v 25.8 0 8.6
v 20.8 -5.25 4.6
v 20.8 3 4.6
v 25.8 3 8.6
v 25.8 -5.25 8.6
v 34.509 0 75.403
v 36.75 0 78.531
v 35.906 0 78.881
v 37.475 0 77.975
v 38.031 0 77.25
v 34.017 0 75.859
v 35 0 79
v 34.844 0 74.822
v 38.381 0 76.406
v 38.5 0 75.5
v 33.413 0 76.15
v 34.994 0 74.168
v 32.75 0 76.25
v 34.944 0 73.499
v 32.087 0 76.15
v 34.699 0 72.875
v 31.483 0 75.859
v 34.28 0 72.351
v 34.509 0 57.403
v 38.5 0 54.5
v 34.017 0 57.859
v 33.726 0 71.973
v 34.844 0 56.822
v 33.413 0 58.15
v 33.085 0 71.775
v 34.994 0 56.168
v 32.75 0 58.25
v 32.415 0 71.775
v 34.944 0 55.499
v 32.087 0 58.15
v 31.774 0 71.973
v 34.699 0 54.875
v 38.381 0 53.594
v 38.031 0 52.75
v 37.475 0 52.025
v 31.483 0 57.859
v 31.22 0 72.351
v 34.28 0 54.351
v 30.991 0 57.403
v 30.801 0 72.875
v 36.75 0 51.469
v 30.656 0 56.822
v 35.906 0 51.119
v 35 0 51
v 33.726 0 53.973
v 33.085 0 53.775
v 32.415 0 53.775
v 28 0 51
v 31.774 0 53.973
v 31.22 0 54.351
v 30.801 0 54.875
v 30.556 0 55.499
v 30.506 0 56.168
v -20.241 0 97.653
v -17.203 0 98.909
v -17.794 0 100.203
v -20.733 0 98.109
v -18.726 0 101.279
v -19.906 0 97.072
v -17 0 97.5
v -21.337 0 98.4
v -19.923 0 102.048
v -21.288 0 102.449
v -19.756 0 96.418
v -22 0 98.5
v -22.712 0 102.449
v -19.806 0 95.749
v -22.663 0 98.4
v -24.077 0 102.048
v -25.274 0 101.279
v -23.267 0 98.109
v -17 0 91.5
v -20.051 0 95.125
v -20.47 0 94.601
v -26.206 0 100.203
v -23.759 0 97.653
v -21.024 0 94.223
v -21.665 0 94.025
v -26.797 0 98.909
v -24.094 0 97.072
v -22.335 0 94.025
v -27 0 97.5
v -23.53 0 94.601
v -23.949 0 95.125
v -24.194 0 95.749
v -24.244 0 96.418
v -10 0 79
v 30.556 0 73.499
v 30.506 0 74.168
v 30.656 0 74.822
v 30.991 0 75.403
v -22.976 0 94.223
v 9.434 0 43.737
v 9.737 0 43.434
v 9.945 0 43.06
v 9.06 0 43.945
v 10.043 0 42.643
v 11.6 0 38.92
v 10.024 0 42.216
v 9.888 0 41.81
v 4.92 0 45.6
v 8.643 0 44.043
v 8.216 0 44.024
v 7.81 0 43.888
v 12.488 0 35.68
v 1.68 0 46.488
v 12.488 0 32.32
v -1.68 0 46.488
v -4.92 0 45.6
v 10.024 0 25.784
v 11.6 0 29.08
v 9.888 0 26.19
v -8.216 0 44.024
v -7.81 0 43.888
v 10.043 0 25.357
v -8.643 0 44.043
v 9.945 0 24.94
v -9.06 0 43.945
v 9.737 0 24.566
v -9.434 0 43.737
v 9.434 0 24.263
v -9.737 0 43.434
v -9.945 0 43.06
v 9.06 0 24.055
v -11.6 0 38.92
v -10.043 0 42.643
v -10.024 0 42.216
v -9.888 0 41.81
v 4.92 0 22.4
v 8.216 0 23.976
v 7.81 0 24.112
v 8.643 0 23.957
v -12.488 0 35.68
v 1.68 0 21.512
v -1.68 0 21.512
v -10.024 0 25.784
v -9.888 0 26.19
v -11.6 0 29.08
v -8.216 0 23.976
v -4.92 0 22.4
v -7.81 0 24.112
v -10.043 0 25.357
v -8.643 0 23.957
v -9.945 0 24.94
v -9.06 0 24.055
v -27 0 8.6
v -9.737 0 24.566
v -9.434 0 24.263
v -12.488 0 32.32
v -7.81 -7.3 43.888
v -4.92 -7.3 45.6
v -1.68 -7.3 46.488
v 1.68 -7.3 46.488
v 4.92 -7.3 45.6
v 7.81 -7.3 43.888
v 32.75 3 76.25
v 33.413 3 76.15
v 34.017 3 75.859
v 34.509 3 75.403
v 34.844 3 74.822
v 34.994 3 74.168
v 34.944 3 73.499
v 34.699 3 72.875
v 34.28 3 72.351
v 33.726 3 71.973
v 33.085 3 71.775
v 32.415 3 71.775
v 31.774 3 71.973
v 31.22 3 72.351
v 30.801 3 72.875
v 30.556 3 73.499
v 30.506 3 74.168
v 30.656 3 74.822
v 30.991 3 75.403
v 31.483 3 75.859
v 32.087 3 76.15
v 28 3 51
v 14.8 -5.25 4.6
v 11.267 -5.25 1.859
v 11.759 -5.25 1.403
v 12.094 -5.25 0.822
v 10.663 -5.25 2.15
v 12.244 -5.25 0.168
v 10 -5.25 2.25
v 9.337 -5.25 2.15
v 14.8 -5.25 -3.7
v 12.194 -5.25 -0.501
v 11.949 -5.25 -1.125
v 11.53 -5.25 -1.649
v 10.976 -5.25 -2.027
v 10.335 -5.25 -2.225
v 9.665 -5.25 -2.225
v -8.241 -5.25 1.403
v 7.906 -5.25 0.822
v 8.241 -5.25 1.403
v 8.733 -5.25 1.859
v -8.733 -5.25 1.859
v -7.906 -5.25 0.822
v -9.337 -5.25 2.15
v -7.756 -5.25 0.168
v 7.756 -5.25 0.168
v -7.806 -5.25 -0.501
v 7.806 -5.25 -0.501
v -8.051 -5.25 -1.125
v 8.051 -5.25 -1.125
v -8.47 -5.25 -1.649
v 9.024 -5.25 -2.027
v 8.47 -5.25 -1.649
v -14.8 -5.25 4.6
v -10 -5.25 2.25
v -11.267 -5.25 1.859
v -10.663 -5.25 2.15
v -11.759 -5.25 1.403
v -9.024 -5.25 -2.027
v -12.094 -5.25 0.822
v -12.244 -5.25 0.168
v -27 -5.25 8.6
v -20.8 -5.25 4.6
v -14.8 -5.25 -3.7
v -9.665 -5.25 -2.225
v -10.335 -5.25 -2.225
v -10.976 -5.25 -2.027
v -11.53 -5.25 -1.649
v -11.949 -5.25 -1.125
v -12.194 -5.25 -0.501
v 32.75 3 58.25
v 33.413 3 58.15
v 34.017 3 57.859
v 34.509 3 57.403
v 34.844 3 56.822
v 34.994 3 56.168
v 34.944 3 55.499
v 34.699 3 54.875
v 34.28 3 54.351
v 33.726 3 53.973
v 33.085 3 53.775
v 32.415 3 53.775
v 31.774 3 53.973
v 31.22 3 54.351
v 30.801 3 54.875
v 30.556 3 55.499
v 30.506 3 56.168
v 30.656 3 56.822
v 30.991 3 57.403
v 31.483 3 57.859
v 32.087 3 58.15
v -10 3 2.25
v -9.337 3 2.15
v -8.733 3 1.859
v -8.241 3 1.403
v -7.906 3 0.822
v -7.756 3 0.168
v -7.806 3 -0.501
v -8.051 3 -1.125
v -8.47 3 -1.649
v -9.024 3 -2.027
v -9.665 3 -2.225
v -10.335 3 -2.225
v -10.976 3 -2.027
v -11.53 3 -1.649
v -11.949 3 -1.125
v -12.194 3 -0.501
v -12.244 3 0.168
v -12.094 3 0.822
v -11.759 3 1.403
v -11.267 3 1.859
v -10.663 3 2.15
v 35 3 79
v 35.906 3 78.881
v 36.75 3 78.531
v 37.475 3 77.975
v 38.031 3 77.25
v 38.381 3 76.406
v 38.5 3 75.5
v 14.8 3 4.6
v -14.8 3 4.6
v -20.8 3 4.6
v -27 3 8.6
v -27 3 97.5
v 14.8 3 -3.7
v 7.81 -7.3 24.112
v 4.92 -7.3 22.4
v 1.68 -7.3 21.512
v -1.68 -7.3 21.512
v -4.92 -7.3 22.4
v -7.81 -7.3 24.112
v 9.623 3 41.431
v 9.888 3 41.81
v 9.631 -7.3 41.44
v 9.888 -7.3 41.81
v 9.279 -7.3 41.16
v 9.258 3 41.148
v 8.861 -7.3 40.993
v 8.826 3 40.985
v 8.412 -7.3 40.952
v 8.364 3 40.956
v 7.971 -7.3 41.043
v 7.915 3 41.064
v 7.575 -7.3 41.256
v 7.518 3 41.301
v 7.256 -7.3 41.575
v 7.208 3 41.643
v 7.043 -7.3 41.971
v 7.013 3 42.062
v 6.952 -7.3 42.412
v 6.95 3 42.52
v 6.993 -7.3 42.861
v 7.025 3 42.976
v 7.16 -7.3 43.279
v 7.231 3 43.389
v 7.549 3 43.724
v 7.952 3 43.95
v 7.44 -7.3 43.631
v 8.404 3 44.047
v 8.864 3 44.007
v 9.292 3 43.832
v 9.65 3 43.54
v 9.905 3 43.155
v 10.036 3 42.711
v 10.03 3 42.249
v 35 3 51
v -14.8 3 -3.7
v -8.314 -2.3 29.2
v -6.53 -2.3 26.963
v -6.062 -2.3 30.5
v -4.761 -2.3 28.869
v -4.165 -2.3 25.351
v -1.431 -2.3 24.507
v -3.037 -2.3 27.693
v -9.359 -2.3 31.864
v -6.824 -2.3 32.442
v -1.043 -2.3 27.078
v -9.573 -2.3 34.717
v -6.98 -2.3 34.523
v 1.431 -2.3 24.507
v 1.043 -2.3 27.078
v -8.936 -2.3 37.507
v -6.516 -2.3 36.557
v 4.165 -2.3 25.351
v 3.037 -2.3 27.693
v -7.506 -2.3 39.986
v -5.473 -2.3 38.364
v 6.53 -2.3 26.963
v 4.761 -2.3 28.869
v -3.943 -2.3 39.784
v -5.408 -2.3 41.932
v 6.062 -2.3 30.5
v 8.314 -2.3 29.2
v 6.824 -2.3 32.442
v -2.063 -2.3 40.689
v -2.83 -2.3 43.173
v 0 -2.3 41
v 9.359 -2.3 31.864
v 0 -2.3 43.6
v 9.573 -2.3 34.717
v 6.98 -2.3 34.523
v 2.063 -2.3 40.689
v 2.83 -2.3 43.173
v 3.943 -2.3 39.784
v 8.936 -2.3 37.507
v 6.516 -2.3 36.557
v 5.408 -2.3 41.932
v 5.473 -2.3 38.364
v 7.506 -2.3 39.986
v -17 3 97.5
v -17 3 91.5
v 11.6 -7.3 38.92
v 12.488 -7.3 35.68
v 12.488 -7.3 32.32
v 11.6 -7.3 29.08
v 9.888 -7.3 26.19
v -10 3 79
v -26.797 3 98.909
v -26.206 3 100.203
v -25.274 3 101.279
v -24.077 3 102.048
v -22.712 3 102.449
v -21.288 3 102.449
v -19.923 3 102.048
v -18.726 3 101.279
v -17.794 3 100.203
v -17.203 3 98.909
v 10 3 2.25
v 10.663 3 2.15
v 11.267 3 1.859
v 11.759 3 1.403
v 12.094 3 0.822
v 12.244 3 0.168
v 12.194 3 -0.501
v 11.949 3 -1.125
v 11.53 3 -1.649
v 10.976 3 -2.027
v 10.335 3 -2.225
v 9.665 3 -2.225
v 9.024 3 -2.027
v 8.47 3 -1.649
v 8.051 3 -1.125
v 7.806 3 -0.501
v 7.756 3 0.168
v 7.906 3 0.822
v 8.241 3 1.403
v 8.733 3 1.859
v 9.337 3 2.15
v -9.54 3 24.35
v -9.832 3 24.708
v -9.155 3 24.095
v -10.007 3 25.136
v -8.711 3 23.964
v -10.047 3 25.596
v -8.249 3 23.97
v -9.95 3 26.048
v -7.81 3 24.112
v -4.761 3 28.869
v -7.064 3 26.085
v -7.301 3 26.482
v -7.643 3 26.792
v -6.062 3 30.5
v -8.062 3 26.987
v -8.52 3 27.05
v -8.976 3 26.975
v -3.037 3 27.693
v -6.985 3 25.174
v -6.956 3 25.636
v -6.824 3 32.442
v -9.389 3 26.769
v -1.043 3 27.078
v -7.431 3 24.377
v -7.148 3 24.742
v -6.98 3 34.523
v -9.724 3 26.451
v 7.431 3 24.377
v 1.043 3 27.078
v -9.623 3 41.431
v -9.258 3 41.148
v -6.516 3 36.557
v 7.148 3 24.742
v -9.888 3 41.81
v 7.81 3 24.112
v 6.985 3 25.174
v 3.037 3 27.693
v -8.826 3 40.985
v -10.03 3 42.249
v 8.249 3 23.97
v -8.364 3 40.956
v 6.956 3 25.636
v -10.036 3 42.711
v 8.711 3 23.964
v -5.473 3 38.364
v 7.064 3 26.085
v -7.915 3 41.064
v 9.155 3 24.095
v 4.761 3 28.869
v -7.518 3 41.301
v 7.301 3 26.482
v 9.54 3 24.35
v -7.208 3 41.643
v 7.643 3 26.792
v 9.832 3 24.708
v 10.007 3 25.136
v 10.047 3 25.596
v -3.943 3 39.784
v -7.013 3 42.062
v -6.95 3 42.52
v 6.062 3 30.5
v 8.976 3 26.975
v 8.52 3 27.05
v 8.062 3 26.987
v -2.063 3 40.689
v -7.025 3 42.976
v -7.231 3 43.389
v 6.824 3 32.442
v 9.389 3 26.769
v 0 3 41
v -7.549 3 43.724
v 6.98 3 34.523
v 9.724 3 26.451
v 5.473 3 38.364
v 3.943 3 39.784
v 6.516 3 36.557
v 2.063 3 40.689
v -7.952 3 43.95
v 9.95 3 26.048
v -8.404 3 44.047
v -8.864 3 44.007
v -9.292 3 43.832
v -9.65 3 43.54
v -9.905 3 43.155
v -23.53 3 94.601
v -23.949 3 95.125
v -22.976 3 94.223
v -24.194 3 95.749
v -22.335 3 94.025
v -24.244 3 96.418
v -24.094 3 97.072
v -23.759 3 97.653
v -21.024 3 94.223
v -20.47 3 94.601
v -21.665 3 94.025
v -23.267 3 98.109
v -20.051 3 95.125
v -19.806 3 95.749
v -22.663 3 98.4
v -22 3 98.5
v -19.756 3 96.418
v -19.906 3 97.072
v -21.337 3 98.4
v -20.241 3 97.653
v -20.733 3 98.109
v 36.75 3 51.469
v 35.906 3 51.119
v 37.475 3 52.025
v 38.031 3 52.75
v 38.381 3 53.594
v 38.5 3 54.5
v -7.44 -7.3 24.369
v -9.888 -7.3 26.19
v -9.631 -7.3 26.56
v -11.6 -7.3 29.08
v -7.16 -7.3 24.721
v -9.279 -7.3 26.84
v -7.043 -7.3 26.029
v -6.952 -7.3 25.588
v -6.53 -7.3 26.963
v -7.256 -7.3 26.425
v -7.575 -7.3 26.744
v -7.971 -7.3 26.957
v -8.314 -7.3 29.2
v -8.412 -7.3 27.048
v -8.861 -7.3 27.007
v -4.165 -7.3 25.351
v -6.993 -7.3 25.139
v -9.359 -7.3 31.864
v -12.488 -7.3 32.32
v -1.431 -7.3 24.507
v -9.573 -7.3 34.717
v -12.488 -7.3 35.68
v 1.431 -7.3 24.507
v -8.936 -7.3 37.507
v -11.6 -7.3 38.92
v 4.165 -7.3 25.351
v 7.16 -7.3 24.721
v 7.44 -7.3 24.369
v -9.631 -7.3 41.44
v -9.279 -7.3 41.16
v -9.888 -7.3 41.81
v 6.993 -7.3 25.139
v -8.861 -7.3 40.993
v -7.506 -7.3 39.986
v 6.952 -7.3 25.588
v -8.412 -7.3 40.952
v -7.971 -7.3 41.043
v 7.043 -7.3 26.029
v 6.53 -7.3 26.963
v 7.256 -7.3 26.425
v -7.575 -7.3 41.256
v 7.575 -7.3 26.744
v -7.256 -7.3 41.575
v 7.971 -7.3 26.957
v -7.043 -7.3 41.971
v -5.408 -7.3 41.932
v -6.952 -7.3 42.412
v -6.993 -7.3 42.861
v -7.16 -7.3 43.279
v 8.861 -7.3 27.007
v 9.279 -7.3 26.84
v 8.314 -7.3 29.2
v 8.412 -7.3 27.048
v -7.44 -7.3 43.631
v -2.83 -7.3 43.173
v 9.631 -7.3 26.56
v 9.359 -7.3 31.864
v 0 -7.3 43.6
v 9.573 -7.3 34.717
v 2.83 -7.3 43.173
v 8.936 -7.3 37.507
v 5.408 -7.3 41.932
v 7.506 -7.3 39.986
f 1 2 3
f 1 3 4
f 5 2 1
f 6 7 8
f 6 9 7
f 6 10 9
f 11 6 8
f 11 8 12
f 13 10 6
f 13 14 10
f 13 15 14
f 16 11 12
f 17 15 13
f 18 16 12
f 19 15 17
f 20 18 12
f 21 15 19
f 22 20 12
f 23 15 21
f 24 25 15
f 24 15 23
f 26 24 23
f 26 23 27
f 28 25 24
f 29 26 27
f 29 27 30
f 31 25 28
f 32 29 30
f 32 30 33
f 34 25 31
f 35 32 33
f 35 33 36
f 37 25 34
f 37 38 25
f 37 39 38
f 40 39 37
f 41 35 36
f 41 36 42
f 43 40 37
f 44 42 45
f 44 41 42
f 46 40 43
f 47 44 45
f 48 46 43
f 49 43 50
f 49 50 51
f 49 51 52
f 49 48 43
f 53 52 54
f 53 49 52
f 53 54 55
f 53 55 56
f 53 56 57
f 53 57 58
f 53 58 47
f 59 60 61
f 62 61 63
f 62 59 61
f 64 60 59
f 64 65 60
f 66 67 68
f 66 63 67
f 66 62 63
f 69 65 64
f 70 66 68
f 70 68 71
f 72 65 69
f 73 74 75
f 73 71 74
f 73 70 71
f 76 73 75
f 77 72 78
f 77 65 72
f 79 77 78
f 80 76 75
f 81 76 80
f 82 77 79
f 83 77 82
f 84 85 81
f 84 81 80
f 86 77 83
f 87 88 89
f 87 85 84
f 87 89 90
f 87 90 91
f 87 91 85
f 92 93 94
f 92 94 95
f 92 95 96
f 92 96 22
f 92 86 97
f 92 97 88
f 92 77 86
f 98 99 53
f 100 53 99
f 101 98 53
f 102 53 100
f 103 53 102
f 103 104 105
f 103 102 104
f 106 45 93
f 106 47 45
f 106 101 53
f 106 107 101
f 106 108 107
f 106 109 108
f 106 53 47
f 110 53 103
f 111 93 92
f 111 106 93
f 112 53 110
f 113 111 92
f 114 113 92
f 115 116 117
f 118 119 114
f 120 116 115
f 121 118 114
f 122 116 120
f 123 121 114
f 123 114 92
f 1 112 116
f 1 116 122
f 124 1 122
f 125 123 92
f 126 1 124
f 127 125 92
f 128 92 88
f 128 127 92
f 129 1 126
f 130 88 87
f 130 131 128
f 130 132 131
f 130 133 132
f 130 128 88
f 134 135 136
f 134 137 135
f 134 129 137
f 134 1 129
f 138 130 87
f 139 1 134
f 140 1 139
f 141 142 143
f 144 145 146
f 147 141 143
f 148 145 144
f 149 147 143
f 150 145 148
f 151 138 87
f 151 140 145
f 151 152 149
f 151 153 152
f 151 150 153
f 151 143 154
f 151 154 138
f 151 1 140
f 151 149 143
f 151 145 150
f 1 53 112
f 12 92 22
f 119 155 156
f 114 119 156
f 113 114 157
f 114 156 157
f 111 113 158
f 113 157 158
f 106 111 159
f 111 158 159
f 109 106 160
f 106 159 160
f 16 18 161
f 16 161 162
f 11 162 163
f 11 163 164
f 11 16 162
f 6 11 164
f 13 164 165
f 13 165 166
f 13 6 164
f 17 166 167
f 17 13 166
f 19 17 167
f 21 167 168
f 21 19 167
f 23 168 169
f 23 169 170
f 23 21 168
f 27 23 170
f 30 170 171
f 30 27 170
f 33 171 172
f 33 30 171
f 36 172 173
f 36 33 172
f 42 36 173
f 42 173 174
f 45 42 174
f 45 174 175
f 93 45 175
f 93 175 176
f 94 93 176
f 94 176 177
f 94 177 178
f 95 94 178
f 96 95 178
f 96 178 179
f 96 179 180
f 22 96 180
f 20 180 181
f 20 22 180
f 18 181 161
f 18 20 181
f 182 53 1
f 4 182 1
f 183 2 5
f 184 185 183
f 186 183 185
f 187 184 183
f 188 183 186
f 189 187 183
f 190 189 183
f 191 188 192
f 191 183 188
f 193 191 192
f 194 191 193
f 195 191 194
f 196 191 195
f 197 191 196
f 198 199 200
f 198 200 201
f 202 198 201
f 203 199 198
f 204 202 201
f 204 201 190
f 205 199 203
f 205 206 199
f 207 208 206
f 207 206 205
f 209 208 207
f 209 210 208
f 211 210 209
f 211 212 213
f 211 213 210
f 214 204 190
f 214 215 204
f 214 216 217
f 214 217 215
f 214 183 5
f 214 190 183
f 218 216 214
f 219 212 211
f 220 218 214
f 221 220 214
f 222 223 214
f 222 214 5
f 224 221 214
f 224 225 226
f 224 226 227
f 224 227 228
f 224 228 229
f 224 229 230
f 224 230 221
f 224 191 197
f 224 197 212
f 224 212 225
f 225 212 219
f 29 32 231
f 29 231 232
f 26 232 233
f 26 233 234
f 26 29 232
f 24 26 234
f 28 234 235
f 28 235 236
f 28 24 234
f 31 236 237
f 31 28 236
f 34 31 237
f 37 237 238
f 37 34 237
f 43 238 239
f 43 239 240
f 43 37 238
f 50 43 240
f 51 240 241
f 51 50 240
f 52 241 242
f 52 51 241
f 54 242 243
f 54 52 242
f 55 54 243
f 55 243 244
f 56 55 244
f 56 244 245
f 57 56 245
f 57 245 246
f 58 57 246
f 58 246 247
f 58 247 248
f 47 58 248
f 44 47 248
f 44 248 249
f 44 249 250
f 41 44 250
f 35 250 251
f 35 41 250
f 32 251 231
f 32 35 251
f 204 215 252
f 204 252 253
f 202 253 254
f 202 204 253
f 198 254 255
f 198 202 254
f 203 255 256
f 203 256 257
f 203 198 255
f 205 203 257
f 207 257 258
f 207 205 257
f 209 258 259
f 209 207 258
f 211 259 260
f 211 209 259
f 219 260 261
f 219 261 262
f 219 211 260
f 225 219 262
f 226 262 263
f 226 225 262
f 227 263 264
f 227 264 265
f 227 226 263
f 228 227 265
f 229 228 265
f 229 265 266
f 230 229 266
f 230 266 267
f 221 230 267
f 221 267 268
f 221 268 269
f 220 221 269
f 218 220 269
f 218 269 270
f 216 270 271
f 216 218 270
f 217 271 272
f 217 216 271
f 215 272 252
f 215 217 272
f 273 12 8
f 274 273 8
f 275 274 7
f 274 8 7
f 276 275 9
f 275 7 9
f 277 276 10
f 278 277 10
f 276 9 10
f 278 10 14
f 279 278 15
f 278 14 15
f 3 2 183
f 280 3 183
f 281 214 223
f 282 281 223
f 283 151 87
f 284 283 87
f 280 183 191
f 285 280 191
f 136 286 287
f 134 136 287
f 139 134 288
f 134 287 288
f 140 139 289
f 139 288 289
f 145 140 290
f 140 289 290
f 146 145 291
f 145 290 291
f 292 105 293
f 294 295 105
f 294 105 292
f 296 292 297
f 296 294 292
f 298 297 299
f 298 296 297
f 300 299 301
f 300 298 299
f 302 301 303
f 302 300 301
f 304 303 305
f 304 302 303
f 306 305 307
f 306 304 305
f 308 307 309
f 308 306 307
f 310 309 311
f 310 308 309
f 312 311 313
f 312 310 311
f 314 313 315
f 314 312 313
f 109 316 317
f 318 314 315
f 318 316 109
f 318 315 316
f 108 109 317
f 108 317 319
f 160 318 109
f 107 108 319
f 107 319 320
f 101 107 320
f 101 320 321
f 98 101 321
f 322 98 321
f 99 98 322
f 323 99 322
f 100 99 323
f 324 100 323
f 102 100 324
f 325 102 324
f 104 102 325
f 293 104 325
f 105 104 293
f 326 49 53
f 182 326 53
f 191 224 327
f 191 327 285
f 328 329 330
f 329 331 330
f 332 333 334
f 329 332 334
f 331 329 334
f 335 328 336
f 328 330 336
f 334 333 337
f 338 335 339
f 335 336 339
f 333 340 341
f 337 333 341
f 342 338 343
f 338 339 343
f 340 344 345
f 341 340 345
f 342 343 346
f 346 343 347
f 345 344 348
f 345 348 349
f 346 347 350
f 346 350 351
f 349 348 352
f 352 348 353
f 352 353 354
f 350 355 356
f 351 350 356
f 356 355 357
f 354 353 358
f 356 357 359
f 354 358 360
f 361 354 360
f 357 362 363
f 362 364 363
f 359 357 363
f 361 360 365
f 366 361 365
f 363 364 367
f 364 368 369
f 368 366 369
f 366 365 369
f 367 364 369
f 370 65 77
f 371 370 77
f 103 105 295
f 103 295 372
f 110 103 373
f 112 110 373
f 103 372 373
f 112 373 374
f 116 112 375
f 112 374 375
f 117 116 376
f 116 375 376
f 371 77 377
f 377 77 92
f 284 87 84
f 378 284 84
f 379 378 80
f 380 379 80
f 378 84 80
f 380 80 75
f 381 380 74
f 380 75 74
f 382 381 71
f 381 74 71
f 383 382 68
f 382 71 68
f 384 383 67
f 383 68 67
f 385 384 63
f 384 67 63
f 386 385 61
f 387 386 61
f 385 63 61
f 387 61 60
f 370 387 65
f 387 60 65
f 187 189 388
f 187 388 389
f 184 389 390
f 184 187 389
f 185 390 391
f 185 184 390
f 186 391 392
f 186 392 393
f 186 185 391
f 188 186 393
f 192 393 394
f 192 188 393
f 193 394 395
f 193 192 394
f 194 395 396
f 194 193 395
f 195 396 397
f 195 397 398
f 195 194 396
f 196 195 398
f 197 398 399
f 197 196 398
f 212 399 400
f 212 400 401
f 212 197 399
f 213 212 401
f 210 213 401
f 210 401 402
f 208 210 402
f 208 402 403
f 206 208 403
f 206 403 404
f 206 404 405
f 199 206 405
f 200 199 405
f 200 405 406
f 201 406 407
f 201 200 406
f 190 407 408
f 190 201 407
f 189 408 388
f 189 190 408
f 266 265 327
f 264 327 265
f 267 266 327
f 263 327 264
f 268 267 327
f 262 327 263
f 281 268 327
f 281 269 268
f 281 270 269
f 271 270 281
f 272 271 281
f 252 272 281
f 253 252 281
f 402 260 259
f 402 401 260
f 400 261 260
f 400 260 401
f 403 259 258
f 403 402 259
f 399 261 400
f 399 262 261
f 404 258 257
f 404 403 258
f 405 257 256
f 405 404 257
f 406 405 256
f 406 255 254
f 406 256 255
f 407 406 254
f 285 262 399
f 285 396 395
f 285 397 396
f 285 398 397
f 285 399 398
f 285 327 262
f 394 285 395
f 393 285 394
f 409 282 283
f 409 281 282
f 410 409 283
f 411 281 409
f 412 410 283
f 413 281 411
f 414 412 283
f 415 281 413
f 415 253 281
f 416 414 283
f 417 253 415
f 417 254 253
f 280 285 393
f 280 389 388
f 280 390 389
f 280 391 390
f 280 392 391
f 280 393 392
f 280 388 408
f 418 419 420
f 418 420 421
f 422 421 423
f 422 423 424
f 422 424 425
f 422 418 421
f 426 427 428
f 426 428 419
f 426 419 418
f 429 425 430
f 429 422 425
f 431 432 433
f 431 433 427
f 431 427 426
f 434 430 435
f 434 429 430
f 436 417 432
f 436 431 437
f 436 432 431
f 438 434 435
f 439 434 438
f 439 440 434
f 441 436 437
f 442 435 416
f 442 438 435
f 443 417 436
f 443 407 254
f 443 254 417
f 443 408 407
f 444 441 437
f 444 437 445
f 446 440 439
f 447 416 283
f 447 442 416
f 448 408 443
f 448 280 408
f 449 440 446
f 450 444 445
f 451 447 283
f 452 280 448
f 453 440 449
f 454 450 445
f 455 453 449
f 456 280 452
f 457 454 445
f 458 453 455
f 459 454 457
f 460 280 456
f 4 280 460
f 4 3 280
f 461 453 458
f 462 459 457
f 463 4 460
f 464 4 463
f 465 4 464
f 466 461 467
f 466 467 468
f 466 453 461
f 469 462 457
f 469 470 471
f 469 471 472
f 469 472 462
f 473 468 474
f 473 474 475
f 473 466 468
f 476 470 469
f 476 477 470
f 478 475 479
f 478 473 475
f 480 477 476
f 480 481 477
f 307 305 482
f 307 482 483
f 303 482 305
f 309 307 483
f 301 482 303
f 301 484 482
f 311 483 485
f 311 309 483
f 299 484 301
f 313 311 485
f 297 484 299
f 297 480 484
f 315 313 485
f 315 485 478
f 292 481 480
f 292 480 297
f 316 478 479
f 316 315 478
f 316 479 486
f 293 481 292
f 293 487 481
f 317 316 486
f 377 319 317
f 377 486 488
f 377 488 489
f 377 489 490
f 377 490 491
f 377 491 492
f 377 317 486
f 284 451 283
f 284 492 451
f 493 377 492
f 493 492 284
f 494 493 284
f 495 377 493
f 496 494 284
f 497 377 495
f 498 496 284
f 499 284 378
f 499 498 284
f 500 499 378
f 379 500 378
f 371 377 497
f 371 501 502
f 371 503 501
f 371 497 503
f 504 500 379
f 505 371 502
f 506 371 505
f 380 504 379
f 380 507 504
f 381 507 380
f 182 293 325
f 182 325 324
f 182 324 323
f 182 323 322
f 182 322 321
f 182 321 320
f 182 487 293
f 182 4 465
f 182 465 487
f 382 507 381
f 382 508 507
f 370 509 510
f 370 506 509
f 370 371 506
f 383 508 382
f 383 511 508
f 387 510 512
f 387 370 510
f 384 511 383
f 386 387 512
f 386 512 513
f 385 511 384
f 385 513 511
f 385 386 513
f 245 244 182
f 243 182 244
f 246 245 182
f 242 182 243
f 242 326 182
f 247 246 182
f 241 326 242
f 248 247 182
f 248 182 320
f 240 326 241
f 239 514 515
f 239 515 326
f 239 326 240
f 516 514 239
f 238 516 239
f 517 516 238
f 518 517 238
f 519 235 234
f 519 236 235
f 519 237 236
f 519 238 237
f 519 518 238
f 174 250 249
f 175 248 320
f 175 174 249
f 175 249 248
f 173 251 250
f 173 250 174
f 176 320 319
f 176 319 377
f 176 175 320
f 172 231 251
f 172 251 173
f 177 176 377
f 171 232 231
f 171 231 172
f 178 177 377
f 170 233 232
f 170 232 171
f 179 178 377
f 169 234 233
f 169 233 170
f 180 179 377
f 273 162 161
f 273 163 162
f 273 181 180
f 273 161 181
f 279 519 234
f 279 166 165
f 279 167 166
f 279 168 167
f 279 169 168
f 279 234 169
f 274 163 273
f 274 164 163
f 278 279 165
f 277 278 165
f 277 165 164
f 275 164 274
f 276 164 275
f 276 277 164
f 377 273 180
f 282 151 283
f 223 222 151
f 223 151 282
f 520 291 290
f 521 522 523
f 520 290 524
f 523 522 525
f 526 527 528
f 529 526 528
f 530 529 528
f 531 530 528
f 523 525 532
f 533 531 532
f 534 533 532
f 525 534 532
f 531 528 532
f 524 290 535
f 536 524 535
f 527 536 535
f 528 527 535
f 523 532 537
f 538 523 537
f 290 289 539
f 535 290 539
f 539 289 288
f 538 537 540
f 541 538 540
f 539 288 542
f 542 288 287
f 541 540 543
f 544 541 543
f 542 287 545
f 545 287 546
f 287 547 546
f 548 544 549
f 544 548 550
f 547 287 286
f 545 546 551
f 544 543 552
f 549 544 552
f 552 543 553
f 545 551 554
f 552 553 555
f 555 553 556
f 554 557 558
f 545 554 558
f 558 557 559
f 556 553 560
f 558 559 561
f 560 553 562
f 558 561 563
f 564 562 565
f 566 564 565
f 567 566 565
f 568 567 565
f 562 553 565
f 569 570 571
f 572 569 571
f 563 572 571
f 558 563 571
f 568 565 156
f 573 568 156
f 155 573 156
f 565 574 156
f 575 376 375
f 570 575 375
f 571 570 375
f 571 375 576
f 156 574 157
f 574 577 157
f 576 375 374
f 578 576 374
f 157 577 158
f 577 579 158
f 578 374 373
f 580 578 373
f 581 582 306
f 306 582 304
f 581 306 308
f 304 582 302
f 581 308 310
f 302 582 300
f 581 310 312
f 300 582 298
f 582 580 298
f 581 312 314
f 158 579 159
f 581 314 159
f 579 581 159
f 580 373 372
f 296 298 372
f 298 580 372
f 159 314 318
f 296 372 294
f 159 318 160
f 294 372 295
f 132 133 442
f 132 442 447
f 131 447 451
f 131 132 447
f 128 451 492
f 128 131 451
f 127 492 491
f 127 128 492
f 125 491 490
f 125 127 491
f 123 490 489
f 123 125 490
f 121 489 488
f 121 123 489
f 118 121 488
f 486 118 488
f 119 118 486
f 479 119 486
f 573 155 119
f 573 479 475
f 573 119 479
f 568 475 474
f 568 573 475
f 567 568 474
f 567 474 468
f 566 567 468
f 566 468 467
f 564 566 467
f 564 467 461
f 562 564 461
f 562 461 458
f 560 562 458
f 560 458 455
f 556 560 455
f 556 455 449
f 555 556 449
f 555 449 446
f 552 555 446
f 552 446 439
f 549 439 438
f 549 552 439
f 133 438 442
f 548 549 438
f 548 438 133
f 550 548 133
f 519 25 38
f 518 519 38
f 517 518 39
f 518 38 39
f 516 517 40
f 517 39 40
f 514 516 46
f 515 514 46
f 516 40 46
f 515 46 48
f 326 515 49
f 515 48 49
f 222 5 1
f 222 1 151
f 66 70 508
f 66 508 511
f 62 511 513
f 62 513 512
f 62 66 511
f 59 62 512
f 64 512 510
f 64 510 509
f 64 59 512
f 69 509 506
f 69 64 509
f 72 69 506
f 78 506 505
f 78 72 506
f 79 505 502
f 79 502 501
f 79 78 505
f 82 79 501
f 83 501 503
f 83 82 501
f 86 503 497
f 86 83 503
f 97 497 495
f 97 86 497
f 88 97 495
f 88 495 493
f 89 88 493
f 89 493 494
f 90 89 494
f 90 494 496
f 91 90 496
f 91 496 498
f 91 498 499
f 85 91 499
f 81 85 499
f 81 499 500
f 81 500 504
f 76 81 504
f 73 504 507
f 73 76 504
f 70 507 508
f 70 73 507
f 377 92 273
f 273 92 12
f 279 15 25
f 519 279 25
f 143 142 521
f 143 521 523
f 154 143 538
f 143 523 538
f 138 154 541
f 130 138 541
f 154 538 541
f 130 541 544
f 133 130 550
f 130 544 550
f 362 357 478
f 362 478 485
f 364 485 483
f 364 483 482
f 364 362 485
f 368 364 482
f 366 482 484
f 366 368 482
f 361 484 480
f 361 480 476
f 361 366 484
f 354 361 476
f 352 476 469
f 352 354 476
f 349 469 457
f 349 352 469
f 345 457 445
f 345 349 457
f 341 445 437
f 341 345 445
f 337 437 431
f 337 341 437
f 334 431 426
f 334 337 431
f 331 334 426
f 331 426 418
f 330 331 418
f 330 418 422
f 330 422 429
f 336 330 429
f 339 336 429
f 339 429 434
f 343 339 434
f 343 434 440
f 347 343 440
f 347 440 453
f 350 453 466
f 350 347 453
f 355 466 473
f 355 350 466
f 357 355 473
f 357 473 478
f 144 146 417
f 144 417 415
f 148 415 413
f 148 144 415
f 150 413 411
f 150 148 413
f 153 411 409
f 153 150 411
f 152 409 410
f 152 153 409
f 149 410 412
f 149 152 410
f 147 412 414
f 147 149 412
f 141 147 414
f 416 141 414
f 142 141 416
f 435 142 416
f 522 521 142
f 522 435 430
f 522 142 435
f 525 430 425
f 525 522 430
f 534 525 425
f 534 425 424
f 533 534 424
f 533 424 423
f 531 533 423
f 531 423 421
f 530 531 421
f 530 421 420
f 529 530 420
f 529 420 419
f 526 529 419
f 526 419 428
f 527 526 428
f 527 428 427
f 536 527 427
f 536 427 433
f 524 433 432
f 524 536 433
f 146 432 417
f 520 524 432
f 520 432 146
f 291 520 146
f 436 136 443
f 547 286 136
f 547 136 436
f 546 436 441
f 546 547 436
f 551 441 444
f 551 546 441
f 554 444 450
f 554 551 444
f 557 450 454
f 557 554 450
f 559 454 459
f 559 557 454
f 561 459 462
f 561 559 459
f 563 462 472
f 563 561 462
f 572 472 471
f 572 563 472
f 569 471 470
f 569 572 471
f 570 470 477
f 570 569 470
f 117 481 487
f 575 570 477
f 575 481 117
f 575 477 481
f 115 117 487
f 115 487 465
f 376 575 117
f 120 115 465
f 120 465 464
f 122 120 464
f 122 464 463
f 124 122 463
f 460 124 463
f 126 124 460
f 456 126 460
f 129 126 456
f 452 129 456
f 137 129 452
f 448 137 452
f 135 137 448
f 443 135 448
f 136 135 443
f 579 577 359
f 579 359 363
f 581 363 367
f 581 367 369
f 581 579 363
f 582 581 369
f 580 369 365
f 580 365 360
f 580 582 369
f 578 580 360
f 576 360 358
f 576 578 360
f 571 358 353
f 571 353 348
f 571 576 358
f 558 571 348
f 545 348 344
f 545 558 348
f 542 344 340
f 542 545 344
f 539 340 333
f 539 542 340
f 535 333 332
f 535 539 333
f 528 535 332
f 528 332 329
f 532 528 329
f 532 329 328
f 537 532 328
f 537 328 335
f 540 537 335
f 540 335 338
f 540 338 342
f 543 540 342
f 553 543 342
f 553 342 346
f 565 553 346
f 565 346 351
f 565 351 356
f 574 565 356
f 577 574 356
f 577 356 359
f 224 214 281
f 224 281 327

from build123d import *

# Parameters (mm, degrees)
SKETCH1_R                = 12.6
SKETCH1_R_2              = 2.25
BOSS_EXTRUDE1_DEPTH      = 3
BOSS_EXTRUDE2_DEPTH      = 3
BOSS_EXTRUDE2_DEPTH_BACK = 7.3
SKETCH1_23_R             = 12.6
SKETCH1_23_R_2           = 9.6
BOSS_EXTRUDE3_DEPTH      = 3
BOSS_EXTRUDE3_DEPTH_BACK = 2.3
SKETCH1_24_R             = 9.6
SKETCH1_24_R_2           = 7
CUT_EXTRUDE1_DEPTH       = 110.735090103
CUT_EXTRUDE1_DEPTH_BACK  = 110.735090103
SKETCH2_R                = 7
SKETCH2_R_2              = 1.55
BOSS_EXTRUDE4_DEPTH      = 3
BOSS_EXTRUDE4_DEPTH_BACK = 5.25
SKETCH1_25_R             = 2.25


with BuildPart() as part:
    # Sketch1 → Boss-Extrude1 (new body)
    with BuildSketch(Plane(origin=(0, 0, 0), x_dir=(1, 0, 0), z_dir=(0, 1, 0))):
        with BuildLine():
            Line((-20.8, -4.6), (-27, -8.6))
            Line((-27, -8.6), (-27, -97.5))
            ThreePointArc((-27, -97.5), (-22, -102.5), (-17, -97.5))
            Line((-17, -97.5), (-17, -91.5))
            Line((-17, -91.5), (-10, -79))
            Line((-10, -79), (35, -79))
            ThreePointArc((35, -79), (37.474873734, -77.974873734), (38.5, -75.5))
            Line((38.5, -75.5), (38.5, -54.5))
            ThreePointArc((38.5, -54.5), (37.474873734, -52.025126266), (35, -51))
            Line((35, -51), (28, -51))
            Line((28, -51), (25.8, -8.6))
            Line((25.8, -8.6), (20.8, -4.6))
            Line((20.8, -4.6), (-20.8, -4.6))
        make_face()
        with Locations((0, -34)):
            Circle(SKETCH1_R, mode=Mode.SUBTRACT)
        with Locations((32.75, -56)):
            Circle(SKETCH1_R_2, mode=Mode.SUBTRACT)
        with Locations((32.75, -74)):
            Circle(SKETCH1_R_2, mode=Mode.SUBTRACT)
        with Locations((-22, -96.25)):
            Circle(SKETCH1_R_2, mode=Mode.SUBTRACT)
    extrude(amount=BOSS_EXTRUDE1_DEPTH)

    # Sketch1<23> → Boss-Extrude2 (add, two sides: drawn at the far end of the back side and taken through both)
    with BuildSketch(Plane(origin=(0, 0, 0), x_dir=(1, 0, 0), z_dir=(0, 1, 0)).offset(-BOSS_EXTRUDE2_DEPTH_BACK)):
        with Locations((0, -34)):
            Circle(SKETCH1_23_R)
        with Locations((0, -34)):
            Circle(SKETCH1_23_R_2, mode=Mode.SUBTRACT)
    extrude(amount=BOSS_EXTRUDE2_DEPTH + BOSS_EXTRUDE2_DEPTH_BACK)

    # Sketch1<24> → Boss-Extrude3 (add, two sides: drawn at the far end of the back side and taken through both)
    with BuildSketch(Plane(origin=(0, 0, 0), x_dir=(1, 0, 0), z_dir=(0, 1, 0)).offset(-BOSS_EXTRUDE3_DEPTH_BACK)):
        with Locations((0, -34)):
            Circle(SKETCH1_24_R)
        with Locations((0, -34)):
            Circle(SKETCH1_24_R_2, mode=Mode.SUBTRACT)
    extrude(amount=BOSS_EXTRUDE3_DEPTH + BOSS_EXTRUDE3_DEPTH_BACK)

    # Sketch2 → Cut-Extrude1 (cut, two sides: drawn at the far end of the back side and taken through both)
    with BuildSketch(Plane(origin=(0, 0, 0), x_dir=(1, 0, 0), z_dir=(0, 1, 0)).offset(-CUT_EXTRUDE1_DEPTH_BACK)):
        with Locations((0, -34)):
            Circle(SKETCH2_R)
        with Locations((-8.5, -25.5)):
            Circle(SKETCH2_R_2)
        with Locations((8.5, -25.5)):
            Circle(SKETCH2_R_2)
        with Locations((8.5, -42.5)):
            Circle(SKETCH2_R_2)
        with Locations((-8.5, -42.5)):
            Circle(SKETCH2_R_2)
    extrude(amount=CUT_EXTRUDE1_DEPTH + CUT_EXTRUDE1_DEPTH_BACK, mode=Mode.SUBTRACT)

    # Sketch1<25> → Boss-Extrude4 (add, two sides: drawn at the far end of the back side and taken through both)
    with BuildSketch(Plane(origin=(0, 0, 0), x_dir=(1, 0, 0), z_dir=(0, 1, 0)).offset(-BOSS_EXTRUDE4_DEPTH_BACK)):
        Polygon((14.8, 3.7), (-14.8, 3.7), (-14.8, -4.6), (-20.8, -4.6), (-27, -8.6), (25.8, -8.6), (20.8, -4.6), (14.8, -4.6), align=None)
        with Locations((-10, 0)):
            Circle(SKETCH1_25_R, mode=Mode.SUBTRACT)
        with Locations((10, 0)):
            Circle(SKETCH1_25_R, mode=Mode.SUBTRACT)
    extrude(amount=BOSS_EXTRUDE4_DEPTH + BOSS_EXTRUDE4_DEPTH_BACK)


solid = part.part
